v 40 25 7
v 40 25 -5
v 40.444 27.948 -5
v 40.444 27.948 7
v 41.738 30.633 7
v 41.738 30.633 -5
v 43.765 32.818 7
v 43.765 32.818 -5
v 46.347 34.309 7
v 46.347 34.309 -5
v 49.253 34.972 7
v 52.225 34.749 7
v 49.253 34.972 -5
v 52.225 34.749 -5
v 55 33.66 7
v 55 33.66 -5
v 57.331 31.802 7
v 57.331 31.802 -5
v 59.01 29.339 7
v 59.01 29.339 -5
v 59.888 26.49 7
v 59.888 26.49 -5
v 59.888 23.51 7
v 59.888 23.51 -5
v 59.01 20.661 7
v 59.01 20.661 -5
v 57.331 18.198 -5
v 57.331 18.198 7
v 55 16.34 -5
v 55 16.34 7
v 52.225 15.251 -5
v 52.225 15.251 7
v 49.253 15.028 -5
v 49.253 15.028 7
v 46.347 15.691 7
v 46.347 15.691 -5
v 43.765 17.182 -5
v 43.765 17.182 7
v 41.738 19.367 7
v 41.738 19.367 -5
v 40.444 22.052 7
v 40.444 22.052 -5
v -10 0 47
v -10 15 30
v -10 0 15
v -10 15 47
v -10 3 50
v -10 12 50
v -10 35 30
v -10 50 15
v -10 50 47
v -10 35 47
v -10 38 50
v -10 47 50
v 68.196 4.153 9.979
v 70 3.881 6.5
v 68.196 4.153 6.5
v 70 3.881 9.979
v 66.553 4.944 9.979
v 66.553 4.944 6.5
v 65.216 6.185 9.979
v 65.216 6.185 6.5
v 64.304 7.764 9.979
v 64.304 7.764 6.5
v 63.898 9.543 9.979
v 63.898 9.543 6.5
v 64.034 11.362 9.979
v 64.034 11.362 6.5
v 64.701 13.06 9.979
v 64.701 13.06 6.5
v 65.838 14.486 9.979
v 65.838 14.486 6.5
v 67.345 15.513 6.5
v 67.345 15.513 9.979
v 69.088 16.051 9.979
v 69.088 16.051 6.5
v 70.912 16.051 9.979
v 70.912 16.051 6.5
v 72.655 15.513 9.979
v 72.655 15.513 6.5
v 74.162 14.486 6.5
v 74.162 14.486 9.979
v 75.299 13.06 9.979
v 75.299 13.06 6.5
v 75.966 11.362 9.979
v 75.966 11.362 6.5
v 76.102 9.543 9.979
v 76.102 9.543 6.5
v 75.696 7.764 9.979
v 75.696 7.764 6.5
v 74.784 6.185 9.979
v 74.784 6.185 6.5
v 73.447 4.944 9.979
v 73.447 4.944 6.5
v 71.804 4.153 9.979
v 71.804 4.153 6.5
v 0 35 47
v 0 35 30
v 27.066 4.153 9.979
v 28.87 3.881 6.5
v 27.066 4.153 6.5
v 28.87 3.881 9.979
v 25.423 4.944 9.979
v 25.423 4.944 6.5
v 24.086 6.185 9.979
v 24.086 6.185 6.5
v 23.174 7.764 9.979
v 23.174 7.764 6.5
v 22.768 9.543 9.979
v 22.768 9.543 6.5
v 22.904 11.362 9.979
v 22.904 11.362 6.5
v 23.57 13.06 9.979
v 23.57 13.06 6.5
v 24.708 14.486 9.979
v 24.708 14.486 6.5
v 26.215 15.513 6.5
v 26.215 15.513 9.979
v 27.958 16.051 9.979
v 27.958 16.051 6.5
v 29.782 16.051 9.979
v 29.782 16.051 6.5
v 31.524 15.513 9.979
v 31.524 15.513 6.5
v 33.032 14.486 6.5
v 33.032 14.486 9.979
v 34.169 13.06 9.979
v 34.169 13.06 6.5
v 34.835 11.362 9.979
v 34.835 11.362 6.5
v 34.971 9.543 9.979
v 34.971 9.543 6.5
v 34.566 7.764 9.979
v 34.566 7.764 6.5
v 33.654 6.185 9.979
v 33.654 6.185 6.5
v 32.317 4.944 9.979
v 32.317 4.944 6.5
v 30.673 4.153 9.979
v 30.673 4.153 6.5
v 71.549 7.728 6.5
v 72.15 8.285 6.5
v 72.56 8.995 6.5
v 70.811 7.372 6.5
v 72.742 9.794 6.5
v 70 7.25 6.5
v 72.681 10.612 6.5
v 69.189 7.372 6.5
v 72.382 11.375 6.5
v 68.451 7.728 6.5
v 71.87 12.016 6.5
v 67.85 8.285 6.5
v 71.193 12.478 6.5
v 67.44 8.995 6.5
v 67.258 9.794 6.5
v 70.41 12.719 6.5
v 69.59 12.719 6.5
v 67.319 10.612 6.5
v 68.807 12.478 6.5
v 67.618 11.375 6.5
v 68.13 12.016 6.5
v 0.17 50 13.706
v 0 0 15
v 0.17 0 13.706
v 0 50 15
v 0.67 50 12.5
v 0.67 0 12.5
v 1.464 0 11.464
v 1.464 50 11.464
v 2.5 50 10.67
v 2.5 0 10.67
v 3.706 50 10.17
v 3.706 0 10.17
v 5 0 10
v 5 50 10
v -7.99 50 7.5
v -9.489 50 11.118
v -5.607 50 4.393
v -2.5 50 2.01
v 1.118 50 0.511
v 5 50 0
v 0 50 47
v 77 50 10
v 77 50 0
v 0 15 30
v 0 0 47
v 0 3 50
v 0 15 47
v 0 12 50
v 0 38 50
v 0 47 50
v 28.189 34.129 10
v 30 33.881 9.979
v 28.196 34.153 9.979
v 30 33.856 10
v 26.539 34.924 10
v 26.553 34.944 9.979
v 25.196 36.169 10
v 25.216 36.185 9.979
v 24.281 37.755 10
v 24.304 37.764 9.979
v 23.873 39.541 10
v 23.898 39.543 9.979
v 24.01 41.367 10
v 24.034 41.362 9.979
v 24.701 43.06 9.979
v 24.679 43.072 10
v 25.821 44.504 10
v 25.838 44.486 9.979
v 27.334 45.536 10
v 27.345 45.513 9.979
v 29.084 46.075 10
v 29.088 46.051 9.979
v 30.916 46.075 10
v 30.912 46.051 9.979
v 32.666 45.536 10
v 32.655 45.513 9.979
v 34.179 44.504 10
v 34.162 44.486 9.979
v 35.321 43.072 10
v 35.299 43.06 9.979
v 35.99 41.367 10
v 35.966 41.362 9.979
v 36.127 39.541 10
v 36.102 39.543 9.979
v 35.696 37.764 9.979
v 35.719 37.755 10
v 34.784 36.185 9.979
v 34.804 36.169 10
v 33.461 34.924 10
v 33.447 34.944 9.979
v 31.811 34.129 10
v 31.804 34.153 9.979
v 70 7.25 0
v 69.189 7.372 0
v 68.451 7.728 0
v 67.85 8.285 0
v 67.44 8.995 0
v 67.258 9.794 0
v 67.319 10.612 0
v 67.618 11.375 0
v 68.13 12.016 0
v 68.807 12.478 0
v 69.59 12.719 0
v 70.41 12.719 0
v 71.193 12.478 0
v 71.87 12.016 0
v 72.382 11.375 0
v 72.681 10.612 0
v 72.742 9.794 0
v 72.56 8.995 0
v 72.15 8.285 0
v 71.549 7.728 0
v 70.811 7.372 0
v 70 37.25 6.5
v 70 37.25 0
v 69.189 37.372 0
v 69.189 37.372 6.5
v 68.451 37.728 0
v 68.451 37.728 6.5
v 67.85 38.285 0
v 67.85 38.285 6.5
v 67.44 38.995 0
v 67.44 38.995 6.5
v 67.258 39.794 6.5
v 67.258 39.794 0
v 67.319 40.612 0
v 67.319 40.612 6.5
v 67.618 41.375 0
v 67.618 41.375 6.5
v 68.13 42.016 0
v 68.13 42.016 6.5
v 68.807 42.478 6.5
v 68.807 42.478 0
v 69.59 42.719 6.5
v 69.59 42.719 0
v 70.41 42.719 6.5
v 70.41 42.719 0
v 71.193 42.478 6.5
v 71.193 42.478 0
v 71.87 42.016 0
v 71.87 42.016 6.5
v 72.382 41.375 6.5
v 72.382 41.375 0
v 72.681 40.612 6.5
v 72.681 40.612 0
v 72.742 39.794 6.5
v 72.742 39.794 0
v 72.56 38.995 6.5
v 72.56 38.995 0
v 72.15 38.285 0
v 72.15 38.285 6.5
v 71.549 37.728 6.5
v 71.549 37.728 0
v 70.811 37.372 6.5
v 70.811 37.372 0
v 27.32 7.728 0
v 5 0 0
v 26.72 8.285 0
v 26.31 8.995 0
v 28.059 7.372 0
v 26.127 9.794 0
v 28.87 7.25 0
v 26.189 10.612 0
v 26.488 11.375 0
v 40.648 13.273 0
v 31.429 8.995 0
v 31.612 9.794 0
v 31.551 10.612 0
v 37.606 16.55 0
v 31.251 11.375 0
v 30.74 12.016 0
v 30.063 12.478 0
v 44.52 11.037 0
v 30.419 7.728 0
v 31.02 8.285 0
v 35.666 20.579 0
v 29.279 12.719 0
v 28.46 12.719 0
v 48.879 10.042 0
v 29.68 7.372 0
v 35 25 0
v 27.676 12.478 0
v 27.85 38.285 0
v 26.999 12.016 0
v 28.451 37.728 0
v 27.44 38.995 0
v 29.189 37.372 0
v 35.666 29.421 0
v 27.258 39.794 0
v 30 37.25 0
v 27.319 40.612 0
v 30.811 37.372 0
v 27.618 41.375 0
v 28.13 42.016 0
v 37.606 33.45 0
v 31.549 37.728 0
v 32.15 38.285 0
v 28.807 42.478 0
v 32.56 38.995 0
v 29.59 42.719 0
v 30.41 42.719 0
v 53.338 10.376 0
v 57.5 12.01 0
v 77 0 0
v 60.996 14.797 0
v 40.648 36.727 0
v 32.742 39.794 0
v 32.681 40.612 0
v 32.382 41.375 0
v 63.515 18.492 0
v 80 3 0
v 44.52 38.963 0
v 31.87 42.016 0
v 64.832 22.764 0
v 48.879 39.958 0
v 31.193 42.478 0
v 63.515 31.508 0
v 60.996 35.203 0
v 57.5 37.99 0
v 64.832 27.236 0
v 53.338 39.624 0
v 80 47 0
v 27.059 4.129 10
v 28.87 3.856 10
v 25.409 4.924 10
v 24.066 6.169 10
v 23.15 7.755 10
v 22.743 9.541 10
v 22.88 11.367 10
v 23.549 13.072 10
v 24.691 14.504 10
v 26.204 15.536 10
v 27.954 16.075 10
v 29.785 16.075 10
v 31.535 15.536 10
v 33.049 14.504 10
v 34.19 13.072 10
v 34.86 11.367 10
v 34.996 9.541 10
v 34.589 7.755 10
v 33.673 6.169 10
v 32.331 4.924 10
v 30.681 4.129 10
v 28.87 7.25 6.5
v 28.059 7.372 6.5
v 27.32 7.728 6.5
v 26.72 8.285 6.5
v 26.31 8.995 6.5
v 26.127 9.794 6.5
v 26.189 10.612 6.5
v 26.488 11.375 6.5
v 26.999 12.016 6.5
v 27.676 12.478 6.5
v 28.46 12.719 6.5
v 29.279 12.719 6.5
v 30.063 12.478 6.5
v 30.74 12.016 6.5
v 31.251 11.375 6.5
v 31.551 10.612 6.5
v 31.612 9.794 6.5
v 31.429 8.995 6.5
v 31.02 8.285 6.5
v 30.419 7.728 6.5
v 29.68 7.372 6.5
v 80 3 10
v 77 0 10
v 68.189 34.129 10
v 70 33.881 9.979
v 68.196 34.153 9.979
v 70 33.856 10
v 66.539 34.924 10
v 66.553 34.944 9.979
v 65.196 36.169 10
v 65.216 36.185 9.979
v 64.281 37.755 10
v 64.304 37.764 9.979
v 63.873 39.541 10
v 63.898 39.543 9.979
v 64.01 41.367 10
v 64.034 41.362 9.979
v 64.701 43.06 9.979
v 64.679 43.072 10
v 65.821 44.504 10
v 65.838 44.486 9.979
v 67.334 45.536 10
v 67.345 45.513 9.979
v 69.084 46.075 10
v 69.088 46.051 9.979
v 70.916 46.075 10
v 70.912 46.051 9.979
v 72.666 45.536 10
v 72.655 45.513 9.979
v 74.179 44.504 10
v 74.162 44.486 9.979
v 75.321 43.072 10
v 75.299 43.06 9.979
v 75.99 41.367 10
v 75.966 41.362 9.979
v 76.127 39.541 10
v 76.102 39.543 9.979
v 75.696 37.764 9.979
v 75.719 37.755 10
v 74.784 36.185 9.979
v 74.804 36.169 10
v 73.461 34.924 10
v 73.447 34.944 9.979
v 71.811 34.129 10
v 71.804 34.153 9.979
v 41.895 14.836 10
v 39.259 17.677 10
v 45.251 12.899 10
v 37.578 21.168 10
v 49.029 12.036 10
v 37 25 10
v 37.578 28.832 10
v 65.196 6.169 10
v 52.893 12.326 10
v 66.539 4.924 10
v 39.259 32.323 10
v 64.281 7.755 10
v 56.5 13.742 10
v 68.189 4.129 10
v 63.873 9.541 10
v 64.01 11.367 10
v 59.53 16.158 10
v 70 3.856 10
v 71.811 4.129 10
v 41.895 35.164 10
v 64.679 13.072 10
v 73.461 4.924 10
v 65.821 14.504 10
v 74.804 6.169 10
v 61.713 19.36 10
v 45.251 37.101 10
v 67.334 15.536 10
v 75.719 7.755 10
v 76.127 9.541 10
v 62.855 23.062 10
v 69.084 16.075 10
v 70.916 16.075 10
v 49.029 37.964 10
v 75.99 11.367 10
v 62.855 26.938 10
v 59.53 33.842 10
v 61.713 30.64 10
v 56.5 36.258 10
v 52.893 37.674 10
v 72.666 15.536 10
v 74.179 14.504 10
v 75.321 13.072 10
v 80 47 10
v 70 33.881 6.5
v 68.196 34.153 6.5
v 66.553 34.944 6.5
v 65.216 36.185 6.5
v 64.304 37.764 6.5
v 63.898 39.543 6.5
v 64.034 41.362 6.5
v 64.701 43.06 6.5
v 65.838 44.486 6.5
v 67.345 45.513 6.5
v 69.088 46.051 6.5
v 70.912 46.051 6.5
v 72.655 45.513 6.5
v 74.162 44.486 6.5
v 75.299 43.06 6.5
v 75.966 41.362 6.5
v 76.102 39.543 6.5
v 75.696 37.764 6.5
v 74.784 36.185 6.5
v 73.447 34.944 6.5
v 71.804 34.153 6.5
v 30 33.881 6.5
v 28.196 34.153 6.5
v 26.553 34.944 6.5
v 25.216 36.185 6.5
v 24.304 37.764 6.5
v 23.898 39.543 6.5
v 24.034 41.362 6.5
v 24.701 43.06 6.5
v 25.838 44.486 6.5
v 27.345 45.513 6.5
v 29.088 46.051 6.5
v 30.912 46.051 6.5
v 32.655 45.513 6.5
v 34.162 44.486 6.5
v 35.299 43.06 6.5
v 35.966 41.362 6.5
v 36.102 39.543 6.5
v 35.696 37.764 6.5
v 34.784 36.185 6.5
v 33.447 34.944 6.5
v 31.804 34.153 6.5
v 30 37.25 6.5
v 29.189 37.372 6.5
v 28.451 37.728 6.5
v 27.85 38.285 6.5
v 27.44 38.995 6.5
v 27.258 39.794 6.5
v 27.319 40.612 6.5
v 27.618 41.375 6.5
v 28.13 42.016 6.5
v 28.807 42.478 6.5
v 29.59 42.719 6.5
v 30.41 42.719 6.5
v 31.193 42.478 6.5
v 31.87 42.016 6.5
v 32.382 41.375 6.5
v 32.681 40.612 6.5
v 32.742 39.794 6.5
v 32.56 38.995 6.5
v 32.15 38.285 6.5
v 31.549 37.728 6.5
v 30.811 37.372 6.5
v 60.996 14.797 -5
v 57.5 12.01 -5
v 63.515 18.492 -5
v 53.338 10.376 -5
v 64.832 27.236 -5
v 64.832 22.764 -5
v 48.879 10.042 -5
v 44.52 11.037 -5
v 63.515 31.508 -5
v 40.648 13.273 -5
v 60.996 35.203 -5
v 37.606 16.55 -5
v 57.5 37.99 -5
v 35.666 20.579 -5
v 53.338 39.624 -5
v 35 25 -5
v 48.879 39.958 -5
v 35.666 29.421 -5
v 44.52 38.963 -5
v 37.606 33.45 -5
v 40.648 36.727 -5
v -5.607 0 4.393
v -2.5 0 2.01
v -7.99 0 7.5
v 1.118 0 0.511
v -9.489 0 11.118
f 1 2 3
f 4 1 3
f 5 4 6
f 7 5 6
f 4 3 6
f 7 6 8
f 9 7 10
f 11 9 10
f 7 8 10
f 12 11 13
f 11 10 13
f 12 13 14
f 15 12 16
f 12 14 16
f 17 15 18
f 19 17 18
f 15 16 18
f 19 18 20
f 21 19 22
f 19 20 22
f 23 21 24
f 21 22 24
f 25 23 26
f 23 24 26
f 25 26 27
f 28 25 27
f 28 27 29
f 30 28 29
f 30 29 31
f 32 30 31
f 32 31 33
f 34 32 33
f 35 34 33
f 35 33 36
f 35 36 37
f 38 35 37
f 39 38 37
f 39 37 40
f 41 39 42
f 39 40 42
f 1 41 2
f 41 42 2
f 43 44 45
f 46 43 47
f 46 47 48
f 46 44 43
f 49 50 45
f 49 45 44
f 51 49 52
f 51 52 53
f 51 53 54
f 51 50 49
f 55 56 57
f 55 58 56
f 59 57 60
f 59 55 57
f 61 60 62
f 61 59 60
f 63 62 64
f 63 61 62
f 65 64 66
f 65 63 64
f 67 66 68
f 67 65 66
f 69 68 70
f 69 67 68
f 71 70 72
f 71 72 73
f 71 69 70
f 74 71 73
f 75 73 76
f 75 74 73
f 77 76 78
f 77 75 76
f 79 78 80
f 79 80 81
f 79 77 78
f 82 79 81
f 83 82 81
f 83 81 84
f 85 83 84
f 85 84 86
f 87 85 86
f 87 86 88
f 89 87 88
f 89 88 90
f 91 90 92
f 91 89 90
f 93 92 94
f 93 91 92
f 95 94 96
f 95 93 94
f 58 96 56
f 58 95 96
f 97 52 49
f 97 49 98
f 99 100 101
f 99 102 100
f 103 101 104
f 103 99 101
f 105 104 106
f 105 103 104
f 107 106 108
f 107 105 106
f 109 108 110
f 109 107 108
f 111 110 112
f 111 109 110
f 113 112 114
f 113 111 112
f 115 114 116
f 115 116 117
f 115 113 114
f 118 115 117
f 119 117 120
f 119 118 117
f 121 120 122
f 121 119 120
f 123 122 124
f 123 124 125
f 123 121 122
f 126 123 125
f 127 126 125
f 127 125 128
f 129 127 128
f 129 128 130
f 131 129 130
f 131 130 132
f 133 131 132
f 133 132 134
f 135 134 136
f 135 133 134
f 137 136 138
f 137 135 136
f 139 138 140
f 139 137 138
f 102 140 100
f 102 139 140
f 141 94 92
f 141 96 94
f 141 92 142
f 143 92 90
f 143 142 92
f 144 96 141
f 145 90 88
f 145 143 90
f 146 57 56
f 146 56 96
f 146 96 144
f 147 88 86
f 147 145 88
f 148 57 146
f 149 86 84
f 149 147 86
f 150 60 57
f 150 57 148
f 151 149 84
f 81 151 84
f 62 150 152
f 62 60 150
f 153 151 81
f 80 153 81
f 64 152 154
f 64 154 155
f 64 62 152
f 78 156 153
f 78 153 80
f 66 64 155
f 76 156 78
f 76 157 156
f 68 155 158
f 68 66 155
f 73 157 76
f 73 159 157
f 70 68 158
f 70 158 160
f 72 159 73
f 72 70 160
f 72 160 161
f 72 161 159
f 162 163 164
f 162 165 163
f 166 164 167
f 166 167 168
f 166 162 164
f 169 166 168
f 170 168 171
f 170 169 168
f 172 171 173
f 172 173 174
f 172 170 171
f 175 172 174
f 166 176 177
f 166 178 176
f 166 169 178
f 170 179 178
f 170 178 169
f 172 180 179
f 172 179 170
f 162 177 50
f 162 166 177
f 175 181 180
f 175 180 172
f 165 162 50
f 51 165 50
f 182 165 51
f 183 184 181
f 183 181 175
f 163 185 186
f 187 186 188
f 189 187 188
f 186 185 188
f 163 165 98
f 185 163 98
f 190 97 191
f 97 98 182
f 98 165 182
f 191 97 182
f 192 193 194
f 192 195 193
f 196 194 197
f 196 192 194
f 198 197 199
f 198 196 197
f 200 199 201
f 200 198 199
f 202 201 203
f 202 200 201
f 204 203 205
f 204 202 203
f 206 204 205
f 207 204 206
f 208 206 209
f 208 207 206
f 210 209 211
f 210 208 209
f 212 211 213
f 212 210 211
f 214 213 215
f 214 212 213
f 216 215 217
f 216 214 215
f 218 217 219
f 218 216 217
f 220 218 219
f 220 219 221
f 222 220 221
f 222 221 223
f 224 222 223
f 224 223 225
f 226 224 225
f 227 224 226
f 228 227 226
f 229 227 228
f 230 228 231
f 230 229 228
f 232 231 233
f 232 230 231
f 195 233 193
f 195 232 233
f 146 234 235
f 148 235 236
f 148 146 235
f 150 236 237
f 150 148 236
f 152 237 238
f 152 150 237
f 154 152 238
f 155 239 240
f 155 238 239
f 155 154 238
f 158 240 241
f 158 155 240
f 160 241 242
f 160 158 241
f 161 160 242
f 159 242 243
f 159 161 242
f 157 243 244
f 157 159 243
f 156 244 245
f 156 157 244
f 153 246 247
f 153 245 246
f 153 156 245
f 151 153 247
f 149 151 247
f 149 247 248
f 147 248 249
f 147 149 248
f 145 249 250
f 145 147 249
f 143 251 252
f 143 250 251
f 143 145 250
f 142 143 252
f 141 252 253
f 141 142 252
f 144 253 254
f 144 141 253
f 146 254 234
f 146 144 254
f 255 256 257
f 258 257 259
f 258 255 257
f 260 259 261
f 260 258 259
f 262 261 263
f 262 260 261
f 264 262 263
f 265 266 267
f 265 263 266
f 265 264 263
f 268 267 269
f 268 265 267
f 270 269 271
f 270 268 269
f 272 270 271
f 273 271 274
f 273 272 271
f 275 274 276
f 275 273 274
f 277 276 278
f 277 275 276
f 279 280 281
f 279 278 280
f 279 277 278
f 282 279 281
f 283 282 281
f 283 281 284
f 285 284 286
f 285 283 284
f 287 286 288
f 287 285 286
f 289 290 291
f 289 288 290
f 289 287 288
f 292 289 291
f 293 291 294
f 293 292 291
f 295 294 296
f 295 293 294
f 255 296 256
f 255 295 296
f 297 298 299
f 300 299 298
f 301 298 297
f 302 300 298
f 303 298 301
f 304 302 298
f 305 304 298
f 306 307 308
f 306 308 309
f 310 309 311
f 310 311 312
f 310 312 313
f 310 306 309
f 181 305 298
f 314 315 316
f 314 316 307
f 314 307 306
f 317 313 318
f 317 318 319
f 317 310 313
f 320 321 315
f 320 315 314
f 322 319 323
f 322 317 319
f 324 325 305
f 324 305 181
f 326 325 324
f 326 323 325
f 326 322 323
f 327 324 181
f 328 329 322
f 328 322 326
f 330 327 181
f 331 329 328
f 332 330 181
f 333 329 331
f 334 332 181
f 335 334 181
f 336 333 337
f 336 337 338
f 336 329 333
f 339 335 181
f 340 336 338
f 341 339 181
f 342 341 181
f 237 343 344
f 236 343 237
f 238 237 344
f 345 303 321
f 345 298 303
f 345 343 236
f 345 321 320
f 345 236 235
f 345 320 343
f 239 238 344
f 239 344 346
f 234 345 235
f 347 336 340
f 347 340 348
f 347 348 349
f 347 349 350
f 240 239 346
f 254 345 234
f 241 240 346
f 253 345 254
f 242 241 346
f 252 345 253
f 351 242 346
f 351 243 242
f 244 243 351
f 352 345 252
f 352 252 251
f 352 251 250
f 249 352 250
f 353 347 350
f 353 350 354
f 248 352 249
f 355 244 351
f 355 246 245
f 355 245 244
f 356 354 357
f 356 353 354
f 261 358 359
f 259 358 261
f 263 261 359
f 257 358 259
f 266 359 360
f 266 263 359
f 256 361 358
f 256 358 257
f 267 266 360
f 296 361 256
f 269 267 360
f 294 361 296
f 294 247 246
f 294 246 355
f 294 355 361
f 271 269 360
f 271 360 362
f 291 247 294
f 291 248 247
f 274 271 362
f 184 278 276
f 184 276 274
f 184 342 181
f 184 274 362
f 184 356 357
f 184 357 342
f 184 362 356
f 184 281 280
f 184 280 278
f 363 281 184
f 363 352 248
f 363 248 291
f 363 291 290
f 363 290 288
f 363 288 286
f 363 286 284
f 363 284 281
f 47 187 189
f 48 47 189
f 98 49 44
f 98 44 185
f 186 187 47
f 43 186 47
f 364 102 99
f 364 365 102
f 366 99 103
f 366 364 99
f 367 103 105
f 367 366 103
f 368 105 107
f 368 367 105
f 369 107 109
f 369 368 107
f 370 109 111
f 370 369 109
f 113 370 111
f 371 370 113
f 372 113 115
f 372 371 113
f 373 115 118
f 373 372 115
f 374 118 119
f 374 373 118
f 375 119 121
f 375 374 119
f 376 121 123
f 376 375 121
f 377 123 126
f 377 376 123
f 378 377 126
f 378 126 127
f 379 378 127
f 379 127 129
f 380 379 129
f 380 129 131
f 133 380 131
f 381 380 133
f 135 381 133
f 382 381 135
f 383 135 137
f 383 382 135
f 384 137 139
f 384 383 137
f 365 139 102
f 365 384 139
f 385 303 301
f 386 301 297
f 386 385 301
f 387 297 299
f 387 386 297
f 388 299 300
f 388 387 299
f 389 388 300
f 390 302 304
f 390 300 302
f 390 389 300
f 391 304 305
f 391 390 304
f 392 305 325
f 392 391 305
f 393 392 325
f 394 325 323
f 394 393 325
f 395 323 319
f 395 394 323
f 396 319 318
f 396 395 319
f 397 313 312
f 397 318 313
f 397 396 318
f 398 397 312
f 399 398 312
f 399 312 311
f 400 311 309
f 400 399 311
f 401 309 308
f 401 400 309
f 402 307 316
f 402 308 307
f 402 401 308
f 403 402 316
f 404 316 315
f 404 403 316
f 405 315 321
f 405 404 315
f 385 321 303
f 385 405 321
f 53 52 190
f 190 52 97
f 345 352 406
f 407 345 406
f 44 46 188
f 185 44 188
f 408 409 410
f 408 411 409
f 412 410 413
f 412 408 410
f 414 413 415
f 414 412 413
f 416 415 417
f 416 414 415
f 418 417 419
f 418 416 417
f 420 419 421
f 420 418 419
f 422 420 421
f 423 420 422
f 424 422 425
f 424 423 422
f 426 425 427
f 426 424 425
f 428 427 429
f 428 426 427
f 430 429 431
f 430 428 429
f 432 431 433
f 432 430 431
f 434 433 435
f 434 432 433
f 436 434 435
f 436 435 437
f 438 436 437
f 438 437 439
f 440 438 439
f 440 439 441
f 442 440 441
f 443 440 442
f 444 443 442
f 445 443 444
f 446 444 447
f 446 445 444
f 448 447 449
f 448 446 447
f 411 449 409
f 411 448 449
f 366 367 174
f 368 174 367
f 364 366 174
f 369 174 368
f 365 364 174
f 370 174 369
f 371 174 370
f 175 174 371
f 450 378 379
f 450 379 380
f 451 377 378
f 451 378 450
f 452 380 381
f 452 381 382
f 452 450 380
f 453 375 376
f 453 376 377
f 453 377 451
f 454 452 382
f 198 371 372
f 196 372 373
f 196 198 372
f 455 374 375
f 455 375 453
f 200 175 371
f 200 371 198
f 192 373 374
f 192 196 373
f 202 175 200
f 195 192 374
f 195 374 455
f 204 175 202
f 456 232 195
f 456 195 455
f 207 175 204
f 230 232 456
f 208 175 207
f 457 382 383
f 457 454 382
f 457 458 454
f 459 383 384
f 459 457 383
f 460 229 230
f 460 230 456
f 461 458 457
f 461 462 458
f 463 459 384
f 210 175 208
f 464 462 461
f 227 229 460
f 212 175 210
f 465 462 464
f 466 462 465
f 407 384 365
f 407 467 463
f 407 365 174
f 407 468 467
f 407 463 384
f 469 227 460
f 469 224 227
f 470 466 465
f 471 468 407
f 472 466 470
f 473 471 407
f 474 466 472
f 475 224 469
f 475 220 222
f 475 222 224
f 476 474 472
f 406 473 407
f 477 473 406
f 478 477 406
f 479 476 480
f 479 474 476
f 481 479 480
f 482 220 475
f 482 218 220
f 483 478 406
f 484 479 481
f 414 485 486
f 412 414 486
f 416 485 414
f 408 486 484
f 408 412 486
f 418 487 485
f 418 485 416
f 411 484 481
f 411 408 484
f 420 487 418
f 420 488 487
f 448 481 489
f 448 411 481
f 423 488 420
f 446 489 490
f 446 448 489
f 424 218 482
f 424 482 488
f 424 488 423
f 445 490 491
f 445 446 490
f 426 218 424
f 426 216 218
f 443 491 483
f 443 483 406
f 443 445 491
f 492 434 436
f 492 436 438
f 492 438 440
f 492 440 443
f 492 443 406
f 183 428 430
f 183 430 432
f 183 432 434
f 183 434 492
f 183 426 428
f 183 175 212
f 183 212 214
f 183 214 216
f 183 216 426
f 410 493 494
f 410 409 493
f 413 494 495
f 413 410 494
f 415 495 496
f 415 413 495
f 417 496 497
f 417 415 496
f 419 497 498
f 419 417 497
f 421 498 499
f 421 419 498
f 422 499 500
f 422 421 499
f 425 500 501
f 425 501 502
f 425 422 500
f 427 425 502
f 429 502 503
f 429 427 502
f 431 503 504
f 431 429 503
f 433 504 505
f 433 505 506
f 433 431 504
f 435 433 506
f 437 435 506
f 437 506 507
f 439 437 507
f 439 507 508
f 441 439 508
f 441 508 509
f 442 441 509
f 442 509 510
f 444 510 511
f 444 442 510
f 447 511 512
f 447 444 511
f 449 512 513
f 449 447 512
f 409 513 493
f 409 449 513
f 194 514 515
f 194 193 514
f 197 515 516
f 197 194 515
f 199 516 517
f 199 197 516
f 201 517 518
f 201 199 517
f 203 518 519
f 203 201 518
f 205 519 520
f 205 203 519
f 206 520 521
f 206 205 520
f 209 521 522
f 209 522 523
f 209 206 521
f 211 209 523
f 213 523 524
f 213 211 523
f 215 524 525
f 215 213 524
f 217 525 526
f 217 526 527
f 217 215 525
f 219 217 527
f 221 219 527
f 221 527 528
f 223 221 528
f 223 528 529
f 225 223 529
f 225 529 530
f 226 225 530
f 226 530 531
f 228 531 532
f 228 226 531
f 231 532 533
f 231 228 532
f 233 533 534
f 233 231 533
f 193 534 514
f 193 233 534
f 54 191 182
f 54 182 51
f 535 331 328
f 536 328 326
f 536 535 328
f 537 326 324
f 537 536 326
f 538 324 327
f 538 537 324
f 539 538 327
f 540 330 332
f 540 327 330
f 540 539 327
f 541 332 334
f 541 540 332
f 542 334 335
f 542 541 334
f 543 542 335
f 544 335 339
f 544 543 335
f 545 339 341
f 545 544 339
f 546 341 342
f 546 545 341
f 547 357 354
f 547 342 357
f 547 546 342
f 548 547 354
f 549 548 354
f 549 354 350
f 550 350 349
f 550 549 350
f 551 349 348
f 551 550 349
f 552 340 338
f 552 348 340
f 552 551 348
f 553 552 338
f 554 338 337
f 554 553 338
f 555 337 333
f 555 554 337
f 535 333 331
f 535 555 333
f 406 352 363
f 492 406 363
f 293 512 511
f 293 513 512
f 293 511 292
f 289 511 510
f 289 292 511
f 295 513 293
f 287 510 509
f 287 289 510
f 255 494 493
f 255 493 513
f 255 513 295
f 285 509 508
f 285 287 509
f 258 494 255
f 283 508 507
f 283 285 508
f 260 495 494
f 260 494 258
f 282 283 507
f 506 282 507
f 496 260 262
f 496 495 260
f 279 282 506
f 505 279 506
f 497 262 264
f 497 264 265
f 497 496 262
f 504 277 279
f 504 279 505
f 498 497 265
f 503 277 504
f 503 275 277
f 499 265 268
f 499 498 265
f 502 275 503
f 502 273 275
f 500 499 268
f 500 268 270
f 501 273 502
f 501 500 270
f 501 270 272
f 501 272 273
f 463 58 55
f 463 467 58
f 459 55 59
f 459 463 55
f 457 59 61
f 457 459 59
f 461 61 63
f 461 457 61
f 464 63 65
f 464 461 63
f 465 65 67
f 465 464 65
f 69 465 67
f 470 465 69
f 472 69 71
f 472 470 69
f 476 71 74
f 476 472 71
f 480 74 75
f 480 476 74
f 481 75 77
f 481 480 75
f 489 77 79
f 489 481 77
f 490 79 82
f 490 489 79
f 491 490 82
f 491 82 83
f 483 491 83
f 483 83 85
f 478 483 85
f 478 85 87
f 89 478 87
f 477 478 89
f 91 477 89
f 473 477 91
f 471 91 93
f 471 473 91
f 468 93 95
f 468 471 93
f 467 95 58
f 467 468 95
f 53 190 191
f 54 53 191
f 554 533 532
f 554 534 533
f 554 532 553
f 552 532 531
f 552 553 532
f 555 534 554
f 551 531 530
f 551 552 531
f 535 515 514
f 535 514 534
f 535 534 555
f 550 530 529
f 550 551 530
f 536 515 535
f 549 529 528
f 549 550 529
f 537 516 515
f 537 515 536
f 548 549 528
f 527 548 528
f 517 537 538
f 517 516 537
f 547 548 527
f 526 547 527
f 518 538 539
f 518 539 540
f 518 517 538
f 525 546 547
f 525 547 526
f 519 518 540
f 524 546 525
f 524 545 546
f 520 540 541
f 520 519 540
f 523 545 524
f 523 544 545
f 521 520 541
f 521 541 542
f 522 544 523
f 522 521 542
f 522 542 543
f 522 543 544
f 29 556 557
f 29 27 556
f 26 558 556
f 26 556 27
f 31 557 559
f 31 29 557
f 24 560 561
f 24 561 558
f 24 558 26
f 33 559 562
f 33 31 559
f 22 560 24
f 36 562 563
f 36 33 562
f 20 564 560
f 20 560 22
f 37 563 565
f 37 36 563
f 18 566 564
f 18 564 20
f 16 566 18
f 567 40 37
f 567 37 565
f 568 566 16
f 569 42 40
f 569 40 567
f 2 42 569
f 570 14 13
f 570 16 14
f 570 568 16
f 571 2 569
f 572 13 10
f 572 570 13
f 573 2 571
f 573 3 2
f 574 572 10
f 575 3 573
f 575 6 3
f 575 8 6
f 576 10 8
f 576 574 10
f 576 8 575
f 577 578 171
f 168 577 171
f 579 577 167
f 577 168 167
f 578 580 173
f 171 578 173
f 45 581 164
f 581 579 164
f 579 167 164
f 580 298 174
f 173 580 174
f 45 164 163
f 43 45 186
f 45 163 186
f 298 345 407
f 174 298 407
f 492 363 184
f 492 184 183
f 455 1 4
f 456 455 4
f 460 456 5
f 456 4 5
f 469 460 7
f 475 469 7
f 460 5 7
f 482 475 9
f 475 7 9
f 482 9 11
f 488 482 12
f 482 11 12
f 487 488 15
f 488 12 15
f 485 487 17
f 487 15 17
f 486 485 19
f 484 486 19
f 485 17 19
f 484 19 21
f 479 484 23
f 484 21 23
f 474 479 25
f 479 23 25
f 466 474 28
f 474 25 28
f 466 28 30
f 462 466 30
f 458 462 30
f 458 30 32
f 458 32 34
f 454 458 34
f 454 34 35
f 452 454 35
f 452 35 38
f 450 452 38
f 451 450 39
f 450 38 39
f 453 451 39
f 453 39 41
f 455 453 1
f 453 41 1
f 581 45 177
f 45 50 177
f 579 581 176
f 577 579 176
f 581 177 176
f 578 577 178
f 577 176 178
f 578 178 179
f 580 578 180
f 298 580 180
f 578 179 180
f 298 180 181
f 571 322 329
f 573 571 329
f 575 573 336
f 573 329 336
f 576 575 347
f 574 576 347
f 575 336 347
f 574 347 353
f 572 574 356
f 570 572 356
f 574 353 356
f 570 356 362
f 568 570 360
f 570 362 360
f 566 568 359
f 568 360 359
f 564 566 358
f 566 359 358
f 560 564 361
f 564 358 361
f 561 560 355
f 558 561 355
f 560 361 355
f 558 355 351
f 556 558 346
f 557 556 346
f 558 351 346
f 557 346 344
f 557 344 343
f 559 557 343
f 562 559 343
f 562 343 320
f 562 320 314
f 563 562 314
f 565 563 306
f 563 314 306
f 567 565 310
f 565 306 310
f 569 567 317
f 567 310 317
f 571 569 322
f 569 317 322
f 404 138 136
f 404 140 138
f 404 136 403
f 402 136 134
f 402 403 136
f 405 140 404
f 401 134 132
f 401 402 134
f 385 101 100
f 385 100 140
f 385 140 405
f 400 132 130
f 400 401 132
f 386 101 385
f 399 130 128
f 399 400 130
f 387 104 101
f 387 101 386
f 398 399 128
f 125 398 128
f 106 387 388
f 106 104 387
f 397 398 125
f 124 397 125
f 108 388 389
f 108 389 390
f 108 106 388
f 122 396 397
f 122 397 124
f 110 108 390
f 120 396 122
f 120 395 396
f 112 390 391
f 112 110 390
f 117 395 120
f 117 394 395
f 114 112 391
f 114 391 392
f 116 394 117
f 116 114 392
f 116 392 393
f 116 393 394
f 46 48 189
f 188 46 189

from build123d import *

# Parameters (mm, degrees)
SKETCH1_W                              = 80
SKETCH1_H                              = 50
BOSS_EXTRUDE1_DEPTH                    = 10
SKETCH2_W                              = 50
SKETCH2_H                              = 50
BOSS_EXTRUDE2_DEPTH                    = 10
SKETCH5_W                              = 10
SKETCH5_H                              = 20
CUT_EXTRUDE2_DEPTH                     = 20
SKETCH10_R                             = 15
BOSS_EXTRUDE3_DEPTH                    = 5
SKETCH13_R                             = 10
CUT_EXTRUDE4_DEPTH                     = 15
CHAMFER1_SIZE                          = 3
CBORE_FOR_M5_HEX_HEAD_BOLT2_AT_2_COUNT = 2
CBORE_FOR_M5_HEX_HEAD_BOLT2_AT_2_PITCH = 30
CBORE_FOR_M5_HEX_HEAD_BOLT2_AT_3_COUNT = 2
CBORE_FOR_M5_HEX_HEAD_BOLT2_AT_3_PITCH = 50.908866275
CBORE_FOR_M5_HEX_HEAD_BOLT2_AT_4_COUNT = 2
CBORE_FOR_M5_HEX_HEAD_BOLT2_AT_4_PITCH = 40
CHAMFER2_SIZE                          = 3
CHAMFER3_SIZE                          = 3
CHAMFER4_SIZE                          = 3
FILLET1_R                              = 5
FILLET2_R                              = 15


with BuildPart() as part:
    # Sketch1 → Boss-Extrude1 (new body)
    with BuildSketch(Plane.XY):
        with Locations((40, 25)):
            Rectangle(SKETCH1_W, SKETCH1_H)
    extrude(amount=BOSS_EXTRUDE1_DEPTH)

    # Sketch2 → Boss-Extrude2 (add)
    with BuildSketch(Plane.ZY):
        with Locations((25, 25)):
            Rectangle(SKETCH2_W, SKETCH2_H)
    extrude(amount=BOSS_EXTRUDE2_DEPTH)

    # Sketch5 → Cut-Extrude2 (cut)
    with BuildSketch(Plane.XY.offset(50)):
        with Locations((-5, 25)):
            Rectangle(SKETCH5_W, SKETCH5_H)
    extrude(amount=-CUT_EXTRUDE2_DEPTH, mode=Mode.SUBTRACT)

    # Sketch10 → Boss-Extrude3 (add)
    with BuildSketch(Plane(origin=(0, 0, 0), x_dir=(-1, 0, 0), z_dir=(0, 0, -1))):
        with Locations((-50, 25)):
            Circle(SKETCH10_R)
    extrude(amount=BOSS_EXTRUDE3_DEPTH)

    # Sketch13 → Cut-Extrude4 (cut)
    with BuildSketch(Plane(origin=(0, 0, -5), x_dir=(-1, 0, 0), z_dir=(0, 0, -1))):
        with Locations((-50, 25)):
            Circle(SKETCH13_R)
    extrude(amount=-CUT_EXTRUDE4_DEPTH, mode=Mode.SUBTRACT)

    # Chamfer1
    chamfer1_edges = [part.edges().sort_by_distance(p)[0] for p in [
        (60, 25, 10),
    ]]
    chamfer(chamfer1_edges, length=CHAMFER1_SIZE)

    # Sketch19 → CBORE for M5 Hex Head Bolt2 (revolve, cut)
    with BuildSketch(Plane(origin=(70, 40, 10), x_dir=(0, -1, 0), z_dir=(1, 0, 0))):
        Polygon((0, 0), (0, 15), (2.75, 15), (2.75, 3.5), (6.119, 3.5), (6.119, 0.020977491), (6.144, 0), align=None)
    cbore_for_m5_hex_head_bolt2 = revolve(axis=Axis((70, 40, 16.35), (0, 0, -1)), mode=Mode.SUBTRACT)

    # CBORE for M5 Hex Head Bolt2 at 2: CBORE for M5 Hex Head Bolt2 ×2
    with Locations(*[(0, -i * CBORE_FOR_M5_HEX_HEAD_BOLT2_AT_2_PITCH, 0) for i in range(1, CBORE_FOR_M5_HEX_HEAD_BOLT2_AT_2_COUNT)]):
        add(cbore_for_m5_hex_head_bolt2, mode=Mode.SUBTRACT)

    # CBORE for M5 Hex Head Bolt2 at 3: CBORE for M5 Hex Head Bolt2 ×2
    with Locations(*[Vector(-0.80792282, -0.589288314, 0) * (i * CBORE_FOR_M5_HEX_HEAD_BOLT2_AT_3_PITCH) for i in range(1, CBORE_FOR_M5_HEX_HEAD_BOLT2_AT_3_COUNT)]):
        add(cbore_for_m5_hex_head_bolt2, mode=Mode.SUBTRACT)

    # CBORE for M5 Hex Head Bolt2 at 4: CBORE for M5 Hex Head Bolt2 ×2
    with Locations(*[(-i * CBORE_FOR_M5_HEX_HEAD_BOLT2_AT_4_PITCH, 0, 0) for i in range(1, CBORE_FOR_M5_HEX_HEAD_BOLT2_AT_4_COUNT)]):
        add(cbore_for_m5_hex_head_bolt2, mode=Mode.SUBTRACT)

    # Chamfer2
    chamfer2_edges = [part.edges().sort_by_distance(p)[0] for p in [
        (-5, 50, 50),
    ]]
    chamfer(chamfer2_edges, length=CHAMFER2_SIZE)

    # Chamfer3
    chamfer3_edges = [part.edges().sort_by_distance(p)[0] for p in [
        (-5, 35, 50),
    ]]
    chamfer(chamfer3_edges, length=CHAMFER3_SIZE)

    # Chamfer4
    chamfer4_edges = [part.edges().sort_by_distance(p)[0] for p in [
        (-5, 0, 50),
        (-5, 15, 50),
        (80, 50, 5),
        (80, 0, 5),
    ]]
    chamfer(chamfer4_edges, length=CHAMFER4_SIZE)

    # Fillet1
    fillet1_edges = [part.edges().sort_by_distance(p)[0] for p in [
        (0, 25, 10),
    ]]
    fillet(fillet1_edges, radius=FILLET1_R)

    # Fillet2
    fillet2_edges = [part.edges().sort_by_distance(p)[0] for p in [
        (-10, 25, 0),
    ]]
    fillet(fillet2_edges, radius=FILLET2_R)


solid = part.part
